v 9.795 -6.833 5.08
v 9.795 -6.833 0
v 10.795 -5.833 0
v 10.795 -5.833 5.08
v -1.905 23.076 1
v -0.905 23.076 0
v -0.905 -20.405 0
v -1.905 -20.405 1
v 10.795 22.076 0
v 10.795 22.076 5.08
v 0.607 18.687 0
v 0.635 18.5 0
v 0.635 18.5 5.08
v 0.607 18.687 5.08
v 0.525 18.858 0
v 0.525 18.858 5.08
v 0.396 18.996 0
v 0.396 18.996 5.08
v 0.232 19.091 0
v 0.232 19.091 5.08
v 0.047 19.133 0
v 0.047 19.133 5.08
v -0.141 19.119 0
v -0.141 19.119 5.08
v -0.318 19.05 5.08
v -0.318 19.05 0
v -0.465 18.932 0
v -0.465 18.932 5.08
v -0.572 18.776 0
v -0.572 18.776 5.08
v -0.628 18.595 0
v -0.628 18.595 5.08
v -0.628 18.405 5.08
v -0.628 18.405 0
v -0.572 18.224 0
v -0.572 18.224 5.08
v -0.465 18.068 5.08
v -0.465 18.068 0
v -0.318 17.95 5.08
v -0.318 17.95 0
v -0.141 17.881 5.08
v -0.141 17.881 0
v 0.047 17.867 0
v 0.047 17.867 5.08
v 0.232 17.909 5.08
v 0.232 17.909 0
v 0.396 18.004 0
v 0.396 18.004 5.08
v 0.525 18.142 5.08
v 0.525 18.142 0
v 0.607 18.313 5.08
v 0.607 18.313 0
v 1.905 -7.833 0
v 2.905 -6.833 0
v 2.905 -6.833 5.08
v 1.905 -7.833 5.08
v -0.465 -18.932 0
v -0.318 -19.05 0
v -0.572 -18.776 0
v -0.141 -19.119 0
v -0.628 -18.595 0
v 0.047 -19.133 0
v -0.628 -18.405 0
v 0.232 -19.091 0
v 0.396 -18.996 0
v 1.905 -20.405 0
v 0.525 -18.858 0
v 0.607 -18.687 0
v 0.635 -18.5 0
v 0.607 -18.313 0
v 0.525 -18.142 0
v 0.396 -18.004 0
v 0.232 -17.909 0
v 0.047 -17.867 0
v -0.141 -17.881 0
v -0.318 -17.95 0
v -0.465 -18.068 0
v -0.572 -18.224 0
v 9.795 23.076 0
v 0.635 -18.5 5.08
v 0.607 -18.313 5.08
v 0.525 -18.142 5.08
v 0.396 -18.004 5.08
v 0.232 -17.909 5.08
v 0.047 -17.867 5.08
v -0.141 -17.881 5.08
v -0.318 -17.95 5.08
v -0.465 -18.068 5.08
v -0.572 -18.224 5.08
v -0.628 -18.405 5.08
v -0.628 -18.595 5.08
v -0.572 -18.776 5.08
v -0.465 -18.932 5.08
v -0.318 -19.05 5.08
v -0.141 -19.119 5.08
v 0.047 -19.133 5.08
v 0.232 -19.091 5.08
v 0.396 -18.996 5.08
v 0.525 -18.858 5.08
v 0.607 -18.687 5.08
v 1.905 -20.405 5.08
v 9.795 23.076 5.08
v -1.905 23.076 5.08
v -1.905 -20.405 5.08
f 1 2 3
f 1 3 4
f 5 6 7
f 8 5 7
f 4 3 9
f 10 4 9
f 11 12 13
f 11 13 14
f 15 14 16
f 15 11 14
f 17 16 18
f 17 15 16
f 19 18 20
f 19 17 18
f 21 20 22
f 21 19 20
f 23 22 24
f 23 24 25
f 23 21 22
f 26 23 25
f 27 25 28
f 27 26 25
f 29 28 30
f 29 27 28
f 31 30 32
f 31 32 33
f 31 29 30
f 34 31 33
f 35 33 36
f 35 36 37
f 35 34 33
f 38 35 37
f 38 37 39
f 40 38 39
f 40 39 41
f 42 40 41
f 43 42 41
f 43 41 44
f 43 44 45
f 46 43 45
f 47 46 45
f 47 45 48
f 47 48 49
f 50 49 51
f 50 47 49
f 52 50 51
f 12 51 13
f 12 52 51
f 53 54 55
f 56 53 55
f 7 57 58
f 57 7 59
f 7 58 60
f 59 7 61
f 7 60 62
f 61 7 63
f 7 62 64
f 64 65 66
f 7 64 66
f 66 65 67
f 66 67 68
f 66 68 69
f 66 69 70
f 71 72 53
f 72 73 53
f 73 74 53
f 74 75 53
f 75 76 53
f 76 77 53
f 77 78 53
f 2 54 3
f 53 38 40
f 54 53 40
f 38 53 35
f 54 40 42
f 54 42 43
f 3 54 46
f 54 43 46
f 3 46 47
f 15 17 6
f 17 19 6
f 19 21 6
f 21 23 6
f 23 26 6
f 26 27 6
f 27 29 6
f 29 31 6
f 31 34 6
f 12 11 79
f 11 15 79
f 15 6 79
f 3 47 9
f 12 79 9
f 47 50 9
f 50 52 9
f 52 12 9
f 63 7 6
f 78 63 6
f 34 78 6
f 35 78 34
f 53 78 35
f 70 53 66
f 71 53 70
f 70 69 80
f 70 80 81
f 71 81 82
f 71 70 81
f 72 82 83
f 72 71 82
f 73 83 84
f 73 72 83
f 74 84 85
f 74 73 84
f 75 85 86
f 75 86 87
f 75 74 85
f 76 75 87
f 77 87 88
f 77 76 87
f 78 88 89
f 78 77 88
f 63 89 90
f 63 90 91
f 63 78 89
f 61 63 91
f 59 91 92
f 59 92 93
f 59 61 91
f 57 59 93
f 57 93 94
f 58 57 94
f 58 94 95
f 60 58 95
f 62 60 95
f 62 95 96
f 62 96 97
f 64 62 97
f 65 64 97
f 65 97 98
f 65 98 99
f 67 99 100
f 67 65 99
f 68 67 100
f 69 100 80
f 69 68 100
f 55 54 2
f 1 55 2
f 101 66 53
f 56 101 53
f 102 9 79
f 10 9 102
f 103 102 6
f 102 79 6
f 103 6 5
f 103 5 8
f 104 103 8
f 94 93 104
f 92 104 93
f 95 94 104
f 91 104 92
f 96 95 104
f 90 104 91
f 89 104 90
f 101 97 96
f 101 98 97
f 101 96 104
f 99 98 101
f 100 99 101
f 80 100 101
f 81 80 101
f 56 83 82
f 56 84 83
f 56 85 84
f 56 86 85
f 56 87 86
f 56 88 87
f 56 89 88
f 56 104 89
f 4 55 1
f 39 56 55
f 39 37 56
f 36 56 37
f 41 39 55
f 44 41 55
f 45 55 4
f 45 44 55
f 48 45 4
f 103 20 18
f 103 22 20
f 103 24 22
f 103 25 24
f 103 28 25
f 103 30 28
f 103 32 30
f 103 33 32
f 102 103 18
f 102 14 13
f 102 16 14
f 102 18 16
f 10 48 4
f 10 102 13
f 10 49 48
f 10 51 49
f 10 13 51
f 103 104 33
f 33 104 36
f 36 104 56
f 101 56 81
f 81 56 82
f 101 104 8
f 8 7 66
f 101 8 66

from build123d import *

# Parameters (mm, degrees)
SKETCH_R        = 0.635
PAD_DEPTH       = 5.08
CHAMFER_SIZE    = 1
CHAMFER001_SIZE = 1


with BuildPart() as part:
    # Sketch → Pad (new body)
    with BuildSketch(Plane.XY):
        Polygon((-1.905, 23.0759), (-1.905, -20.405), (1.905, -20.405), (1.905, -6.833036), (10.795, -6.833036), (10.795, 23.0759), align=None)
        with Locations((0, 18.5)):
            Circle(SKETCH_R, mode=Mode.SUBTRACT)
        with Locations((0, -18.5)):
            Circle(SKETCH_R, mode=Mode.SUBTRACT)
    extrude(amount=PAD_DEPTH)

    # Chamfer
    chamfer_edges = [part.edges().sort_by_distance(p)[0] for p in [
        (-1.905, 1.33545, 0),
    ]]
    chamfer(chamfer_edges, length=CHAMFER_SIZE)

    # Chamfer001
    chamfer001_edges = [part.edges().sort_by_distance(p)[0] for p in [
        (1.905, -6.833036, 2.54),
        (10.795, -6.833036, 2.54),
        (10.795, 23.0759, 2.54),
    ]]
    chamfer(chamfer001_edges, length=CHAMFER001_SIZE)


solid = part.part
